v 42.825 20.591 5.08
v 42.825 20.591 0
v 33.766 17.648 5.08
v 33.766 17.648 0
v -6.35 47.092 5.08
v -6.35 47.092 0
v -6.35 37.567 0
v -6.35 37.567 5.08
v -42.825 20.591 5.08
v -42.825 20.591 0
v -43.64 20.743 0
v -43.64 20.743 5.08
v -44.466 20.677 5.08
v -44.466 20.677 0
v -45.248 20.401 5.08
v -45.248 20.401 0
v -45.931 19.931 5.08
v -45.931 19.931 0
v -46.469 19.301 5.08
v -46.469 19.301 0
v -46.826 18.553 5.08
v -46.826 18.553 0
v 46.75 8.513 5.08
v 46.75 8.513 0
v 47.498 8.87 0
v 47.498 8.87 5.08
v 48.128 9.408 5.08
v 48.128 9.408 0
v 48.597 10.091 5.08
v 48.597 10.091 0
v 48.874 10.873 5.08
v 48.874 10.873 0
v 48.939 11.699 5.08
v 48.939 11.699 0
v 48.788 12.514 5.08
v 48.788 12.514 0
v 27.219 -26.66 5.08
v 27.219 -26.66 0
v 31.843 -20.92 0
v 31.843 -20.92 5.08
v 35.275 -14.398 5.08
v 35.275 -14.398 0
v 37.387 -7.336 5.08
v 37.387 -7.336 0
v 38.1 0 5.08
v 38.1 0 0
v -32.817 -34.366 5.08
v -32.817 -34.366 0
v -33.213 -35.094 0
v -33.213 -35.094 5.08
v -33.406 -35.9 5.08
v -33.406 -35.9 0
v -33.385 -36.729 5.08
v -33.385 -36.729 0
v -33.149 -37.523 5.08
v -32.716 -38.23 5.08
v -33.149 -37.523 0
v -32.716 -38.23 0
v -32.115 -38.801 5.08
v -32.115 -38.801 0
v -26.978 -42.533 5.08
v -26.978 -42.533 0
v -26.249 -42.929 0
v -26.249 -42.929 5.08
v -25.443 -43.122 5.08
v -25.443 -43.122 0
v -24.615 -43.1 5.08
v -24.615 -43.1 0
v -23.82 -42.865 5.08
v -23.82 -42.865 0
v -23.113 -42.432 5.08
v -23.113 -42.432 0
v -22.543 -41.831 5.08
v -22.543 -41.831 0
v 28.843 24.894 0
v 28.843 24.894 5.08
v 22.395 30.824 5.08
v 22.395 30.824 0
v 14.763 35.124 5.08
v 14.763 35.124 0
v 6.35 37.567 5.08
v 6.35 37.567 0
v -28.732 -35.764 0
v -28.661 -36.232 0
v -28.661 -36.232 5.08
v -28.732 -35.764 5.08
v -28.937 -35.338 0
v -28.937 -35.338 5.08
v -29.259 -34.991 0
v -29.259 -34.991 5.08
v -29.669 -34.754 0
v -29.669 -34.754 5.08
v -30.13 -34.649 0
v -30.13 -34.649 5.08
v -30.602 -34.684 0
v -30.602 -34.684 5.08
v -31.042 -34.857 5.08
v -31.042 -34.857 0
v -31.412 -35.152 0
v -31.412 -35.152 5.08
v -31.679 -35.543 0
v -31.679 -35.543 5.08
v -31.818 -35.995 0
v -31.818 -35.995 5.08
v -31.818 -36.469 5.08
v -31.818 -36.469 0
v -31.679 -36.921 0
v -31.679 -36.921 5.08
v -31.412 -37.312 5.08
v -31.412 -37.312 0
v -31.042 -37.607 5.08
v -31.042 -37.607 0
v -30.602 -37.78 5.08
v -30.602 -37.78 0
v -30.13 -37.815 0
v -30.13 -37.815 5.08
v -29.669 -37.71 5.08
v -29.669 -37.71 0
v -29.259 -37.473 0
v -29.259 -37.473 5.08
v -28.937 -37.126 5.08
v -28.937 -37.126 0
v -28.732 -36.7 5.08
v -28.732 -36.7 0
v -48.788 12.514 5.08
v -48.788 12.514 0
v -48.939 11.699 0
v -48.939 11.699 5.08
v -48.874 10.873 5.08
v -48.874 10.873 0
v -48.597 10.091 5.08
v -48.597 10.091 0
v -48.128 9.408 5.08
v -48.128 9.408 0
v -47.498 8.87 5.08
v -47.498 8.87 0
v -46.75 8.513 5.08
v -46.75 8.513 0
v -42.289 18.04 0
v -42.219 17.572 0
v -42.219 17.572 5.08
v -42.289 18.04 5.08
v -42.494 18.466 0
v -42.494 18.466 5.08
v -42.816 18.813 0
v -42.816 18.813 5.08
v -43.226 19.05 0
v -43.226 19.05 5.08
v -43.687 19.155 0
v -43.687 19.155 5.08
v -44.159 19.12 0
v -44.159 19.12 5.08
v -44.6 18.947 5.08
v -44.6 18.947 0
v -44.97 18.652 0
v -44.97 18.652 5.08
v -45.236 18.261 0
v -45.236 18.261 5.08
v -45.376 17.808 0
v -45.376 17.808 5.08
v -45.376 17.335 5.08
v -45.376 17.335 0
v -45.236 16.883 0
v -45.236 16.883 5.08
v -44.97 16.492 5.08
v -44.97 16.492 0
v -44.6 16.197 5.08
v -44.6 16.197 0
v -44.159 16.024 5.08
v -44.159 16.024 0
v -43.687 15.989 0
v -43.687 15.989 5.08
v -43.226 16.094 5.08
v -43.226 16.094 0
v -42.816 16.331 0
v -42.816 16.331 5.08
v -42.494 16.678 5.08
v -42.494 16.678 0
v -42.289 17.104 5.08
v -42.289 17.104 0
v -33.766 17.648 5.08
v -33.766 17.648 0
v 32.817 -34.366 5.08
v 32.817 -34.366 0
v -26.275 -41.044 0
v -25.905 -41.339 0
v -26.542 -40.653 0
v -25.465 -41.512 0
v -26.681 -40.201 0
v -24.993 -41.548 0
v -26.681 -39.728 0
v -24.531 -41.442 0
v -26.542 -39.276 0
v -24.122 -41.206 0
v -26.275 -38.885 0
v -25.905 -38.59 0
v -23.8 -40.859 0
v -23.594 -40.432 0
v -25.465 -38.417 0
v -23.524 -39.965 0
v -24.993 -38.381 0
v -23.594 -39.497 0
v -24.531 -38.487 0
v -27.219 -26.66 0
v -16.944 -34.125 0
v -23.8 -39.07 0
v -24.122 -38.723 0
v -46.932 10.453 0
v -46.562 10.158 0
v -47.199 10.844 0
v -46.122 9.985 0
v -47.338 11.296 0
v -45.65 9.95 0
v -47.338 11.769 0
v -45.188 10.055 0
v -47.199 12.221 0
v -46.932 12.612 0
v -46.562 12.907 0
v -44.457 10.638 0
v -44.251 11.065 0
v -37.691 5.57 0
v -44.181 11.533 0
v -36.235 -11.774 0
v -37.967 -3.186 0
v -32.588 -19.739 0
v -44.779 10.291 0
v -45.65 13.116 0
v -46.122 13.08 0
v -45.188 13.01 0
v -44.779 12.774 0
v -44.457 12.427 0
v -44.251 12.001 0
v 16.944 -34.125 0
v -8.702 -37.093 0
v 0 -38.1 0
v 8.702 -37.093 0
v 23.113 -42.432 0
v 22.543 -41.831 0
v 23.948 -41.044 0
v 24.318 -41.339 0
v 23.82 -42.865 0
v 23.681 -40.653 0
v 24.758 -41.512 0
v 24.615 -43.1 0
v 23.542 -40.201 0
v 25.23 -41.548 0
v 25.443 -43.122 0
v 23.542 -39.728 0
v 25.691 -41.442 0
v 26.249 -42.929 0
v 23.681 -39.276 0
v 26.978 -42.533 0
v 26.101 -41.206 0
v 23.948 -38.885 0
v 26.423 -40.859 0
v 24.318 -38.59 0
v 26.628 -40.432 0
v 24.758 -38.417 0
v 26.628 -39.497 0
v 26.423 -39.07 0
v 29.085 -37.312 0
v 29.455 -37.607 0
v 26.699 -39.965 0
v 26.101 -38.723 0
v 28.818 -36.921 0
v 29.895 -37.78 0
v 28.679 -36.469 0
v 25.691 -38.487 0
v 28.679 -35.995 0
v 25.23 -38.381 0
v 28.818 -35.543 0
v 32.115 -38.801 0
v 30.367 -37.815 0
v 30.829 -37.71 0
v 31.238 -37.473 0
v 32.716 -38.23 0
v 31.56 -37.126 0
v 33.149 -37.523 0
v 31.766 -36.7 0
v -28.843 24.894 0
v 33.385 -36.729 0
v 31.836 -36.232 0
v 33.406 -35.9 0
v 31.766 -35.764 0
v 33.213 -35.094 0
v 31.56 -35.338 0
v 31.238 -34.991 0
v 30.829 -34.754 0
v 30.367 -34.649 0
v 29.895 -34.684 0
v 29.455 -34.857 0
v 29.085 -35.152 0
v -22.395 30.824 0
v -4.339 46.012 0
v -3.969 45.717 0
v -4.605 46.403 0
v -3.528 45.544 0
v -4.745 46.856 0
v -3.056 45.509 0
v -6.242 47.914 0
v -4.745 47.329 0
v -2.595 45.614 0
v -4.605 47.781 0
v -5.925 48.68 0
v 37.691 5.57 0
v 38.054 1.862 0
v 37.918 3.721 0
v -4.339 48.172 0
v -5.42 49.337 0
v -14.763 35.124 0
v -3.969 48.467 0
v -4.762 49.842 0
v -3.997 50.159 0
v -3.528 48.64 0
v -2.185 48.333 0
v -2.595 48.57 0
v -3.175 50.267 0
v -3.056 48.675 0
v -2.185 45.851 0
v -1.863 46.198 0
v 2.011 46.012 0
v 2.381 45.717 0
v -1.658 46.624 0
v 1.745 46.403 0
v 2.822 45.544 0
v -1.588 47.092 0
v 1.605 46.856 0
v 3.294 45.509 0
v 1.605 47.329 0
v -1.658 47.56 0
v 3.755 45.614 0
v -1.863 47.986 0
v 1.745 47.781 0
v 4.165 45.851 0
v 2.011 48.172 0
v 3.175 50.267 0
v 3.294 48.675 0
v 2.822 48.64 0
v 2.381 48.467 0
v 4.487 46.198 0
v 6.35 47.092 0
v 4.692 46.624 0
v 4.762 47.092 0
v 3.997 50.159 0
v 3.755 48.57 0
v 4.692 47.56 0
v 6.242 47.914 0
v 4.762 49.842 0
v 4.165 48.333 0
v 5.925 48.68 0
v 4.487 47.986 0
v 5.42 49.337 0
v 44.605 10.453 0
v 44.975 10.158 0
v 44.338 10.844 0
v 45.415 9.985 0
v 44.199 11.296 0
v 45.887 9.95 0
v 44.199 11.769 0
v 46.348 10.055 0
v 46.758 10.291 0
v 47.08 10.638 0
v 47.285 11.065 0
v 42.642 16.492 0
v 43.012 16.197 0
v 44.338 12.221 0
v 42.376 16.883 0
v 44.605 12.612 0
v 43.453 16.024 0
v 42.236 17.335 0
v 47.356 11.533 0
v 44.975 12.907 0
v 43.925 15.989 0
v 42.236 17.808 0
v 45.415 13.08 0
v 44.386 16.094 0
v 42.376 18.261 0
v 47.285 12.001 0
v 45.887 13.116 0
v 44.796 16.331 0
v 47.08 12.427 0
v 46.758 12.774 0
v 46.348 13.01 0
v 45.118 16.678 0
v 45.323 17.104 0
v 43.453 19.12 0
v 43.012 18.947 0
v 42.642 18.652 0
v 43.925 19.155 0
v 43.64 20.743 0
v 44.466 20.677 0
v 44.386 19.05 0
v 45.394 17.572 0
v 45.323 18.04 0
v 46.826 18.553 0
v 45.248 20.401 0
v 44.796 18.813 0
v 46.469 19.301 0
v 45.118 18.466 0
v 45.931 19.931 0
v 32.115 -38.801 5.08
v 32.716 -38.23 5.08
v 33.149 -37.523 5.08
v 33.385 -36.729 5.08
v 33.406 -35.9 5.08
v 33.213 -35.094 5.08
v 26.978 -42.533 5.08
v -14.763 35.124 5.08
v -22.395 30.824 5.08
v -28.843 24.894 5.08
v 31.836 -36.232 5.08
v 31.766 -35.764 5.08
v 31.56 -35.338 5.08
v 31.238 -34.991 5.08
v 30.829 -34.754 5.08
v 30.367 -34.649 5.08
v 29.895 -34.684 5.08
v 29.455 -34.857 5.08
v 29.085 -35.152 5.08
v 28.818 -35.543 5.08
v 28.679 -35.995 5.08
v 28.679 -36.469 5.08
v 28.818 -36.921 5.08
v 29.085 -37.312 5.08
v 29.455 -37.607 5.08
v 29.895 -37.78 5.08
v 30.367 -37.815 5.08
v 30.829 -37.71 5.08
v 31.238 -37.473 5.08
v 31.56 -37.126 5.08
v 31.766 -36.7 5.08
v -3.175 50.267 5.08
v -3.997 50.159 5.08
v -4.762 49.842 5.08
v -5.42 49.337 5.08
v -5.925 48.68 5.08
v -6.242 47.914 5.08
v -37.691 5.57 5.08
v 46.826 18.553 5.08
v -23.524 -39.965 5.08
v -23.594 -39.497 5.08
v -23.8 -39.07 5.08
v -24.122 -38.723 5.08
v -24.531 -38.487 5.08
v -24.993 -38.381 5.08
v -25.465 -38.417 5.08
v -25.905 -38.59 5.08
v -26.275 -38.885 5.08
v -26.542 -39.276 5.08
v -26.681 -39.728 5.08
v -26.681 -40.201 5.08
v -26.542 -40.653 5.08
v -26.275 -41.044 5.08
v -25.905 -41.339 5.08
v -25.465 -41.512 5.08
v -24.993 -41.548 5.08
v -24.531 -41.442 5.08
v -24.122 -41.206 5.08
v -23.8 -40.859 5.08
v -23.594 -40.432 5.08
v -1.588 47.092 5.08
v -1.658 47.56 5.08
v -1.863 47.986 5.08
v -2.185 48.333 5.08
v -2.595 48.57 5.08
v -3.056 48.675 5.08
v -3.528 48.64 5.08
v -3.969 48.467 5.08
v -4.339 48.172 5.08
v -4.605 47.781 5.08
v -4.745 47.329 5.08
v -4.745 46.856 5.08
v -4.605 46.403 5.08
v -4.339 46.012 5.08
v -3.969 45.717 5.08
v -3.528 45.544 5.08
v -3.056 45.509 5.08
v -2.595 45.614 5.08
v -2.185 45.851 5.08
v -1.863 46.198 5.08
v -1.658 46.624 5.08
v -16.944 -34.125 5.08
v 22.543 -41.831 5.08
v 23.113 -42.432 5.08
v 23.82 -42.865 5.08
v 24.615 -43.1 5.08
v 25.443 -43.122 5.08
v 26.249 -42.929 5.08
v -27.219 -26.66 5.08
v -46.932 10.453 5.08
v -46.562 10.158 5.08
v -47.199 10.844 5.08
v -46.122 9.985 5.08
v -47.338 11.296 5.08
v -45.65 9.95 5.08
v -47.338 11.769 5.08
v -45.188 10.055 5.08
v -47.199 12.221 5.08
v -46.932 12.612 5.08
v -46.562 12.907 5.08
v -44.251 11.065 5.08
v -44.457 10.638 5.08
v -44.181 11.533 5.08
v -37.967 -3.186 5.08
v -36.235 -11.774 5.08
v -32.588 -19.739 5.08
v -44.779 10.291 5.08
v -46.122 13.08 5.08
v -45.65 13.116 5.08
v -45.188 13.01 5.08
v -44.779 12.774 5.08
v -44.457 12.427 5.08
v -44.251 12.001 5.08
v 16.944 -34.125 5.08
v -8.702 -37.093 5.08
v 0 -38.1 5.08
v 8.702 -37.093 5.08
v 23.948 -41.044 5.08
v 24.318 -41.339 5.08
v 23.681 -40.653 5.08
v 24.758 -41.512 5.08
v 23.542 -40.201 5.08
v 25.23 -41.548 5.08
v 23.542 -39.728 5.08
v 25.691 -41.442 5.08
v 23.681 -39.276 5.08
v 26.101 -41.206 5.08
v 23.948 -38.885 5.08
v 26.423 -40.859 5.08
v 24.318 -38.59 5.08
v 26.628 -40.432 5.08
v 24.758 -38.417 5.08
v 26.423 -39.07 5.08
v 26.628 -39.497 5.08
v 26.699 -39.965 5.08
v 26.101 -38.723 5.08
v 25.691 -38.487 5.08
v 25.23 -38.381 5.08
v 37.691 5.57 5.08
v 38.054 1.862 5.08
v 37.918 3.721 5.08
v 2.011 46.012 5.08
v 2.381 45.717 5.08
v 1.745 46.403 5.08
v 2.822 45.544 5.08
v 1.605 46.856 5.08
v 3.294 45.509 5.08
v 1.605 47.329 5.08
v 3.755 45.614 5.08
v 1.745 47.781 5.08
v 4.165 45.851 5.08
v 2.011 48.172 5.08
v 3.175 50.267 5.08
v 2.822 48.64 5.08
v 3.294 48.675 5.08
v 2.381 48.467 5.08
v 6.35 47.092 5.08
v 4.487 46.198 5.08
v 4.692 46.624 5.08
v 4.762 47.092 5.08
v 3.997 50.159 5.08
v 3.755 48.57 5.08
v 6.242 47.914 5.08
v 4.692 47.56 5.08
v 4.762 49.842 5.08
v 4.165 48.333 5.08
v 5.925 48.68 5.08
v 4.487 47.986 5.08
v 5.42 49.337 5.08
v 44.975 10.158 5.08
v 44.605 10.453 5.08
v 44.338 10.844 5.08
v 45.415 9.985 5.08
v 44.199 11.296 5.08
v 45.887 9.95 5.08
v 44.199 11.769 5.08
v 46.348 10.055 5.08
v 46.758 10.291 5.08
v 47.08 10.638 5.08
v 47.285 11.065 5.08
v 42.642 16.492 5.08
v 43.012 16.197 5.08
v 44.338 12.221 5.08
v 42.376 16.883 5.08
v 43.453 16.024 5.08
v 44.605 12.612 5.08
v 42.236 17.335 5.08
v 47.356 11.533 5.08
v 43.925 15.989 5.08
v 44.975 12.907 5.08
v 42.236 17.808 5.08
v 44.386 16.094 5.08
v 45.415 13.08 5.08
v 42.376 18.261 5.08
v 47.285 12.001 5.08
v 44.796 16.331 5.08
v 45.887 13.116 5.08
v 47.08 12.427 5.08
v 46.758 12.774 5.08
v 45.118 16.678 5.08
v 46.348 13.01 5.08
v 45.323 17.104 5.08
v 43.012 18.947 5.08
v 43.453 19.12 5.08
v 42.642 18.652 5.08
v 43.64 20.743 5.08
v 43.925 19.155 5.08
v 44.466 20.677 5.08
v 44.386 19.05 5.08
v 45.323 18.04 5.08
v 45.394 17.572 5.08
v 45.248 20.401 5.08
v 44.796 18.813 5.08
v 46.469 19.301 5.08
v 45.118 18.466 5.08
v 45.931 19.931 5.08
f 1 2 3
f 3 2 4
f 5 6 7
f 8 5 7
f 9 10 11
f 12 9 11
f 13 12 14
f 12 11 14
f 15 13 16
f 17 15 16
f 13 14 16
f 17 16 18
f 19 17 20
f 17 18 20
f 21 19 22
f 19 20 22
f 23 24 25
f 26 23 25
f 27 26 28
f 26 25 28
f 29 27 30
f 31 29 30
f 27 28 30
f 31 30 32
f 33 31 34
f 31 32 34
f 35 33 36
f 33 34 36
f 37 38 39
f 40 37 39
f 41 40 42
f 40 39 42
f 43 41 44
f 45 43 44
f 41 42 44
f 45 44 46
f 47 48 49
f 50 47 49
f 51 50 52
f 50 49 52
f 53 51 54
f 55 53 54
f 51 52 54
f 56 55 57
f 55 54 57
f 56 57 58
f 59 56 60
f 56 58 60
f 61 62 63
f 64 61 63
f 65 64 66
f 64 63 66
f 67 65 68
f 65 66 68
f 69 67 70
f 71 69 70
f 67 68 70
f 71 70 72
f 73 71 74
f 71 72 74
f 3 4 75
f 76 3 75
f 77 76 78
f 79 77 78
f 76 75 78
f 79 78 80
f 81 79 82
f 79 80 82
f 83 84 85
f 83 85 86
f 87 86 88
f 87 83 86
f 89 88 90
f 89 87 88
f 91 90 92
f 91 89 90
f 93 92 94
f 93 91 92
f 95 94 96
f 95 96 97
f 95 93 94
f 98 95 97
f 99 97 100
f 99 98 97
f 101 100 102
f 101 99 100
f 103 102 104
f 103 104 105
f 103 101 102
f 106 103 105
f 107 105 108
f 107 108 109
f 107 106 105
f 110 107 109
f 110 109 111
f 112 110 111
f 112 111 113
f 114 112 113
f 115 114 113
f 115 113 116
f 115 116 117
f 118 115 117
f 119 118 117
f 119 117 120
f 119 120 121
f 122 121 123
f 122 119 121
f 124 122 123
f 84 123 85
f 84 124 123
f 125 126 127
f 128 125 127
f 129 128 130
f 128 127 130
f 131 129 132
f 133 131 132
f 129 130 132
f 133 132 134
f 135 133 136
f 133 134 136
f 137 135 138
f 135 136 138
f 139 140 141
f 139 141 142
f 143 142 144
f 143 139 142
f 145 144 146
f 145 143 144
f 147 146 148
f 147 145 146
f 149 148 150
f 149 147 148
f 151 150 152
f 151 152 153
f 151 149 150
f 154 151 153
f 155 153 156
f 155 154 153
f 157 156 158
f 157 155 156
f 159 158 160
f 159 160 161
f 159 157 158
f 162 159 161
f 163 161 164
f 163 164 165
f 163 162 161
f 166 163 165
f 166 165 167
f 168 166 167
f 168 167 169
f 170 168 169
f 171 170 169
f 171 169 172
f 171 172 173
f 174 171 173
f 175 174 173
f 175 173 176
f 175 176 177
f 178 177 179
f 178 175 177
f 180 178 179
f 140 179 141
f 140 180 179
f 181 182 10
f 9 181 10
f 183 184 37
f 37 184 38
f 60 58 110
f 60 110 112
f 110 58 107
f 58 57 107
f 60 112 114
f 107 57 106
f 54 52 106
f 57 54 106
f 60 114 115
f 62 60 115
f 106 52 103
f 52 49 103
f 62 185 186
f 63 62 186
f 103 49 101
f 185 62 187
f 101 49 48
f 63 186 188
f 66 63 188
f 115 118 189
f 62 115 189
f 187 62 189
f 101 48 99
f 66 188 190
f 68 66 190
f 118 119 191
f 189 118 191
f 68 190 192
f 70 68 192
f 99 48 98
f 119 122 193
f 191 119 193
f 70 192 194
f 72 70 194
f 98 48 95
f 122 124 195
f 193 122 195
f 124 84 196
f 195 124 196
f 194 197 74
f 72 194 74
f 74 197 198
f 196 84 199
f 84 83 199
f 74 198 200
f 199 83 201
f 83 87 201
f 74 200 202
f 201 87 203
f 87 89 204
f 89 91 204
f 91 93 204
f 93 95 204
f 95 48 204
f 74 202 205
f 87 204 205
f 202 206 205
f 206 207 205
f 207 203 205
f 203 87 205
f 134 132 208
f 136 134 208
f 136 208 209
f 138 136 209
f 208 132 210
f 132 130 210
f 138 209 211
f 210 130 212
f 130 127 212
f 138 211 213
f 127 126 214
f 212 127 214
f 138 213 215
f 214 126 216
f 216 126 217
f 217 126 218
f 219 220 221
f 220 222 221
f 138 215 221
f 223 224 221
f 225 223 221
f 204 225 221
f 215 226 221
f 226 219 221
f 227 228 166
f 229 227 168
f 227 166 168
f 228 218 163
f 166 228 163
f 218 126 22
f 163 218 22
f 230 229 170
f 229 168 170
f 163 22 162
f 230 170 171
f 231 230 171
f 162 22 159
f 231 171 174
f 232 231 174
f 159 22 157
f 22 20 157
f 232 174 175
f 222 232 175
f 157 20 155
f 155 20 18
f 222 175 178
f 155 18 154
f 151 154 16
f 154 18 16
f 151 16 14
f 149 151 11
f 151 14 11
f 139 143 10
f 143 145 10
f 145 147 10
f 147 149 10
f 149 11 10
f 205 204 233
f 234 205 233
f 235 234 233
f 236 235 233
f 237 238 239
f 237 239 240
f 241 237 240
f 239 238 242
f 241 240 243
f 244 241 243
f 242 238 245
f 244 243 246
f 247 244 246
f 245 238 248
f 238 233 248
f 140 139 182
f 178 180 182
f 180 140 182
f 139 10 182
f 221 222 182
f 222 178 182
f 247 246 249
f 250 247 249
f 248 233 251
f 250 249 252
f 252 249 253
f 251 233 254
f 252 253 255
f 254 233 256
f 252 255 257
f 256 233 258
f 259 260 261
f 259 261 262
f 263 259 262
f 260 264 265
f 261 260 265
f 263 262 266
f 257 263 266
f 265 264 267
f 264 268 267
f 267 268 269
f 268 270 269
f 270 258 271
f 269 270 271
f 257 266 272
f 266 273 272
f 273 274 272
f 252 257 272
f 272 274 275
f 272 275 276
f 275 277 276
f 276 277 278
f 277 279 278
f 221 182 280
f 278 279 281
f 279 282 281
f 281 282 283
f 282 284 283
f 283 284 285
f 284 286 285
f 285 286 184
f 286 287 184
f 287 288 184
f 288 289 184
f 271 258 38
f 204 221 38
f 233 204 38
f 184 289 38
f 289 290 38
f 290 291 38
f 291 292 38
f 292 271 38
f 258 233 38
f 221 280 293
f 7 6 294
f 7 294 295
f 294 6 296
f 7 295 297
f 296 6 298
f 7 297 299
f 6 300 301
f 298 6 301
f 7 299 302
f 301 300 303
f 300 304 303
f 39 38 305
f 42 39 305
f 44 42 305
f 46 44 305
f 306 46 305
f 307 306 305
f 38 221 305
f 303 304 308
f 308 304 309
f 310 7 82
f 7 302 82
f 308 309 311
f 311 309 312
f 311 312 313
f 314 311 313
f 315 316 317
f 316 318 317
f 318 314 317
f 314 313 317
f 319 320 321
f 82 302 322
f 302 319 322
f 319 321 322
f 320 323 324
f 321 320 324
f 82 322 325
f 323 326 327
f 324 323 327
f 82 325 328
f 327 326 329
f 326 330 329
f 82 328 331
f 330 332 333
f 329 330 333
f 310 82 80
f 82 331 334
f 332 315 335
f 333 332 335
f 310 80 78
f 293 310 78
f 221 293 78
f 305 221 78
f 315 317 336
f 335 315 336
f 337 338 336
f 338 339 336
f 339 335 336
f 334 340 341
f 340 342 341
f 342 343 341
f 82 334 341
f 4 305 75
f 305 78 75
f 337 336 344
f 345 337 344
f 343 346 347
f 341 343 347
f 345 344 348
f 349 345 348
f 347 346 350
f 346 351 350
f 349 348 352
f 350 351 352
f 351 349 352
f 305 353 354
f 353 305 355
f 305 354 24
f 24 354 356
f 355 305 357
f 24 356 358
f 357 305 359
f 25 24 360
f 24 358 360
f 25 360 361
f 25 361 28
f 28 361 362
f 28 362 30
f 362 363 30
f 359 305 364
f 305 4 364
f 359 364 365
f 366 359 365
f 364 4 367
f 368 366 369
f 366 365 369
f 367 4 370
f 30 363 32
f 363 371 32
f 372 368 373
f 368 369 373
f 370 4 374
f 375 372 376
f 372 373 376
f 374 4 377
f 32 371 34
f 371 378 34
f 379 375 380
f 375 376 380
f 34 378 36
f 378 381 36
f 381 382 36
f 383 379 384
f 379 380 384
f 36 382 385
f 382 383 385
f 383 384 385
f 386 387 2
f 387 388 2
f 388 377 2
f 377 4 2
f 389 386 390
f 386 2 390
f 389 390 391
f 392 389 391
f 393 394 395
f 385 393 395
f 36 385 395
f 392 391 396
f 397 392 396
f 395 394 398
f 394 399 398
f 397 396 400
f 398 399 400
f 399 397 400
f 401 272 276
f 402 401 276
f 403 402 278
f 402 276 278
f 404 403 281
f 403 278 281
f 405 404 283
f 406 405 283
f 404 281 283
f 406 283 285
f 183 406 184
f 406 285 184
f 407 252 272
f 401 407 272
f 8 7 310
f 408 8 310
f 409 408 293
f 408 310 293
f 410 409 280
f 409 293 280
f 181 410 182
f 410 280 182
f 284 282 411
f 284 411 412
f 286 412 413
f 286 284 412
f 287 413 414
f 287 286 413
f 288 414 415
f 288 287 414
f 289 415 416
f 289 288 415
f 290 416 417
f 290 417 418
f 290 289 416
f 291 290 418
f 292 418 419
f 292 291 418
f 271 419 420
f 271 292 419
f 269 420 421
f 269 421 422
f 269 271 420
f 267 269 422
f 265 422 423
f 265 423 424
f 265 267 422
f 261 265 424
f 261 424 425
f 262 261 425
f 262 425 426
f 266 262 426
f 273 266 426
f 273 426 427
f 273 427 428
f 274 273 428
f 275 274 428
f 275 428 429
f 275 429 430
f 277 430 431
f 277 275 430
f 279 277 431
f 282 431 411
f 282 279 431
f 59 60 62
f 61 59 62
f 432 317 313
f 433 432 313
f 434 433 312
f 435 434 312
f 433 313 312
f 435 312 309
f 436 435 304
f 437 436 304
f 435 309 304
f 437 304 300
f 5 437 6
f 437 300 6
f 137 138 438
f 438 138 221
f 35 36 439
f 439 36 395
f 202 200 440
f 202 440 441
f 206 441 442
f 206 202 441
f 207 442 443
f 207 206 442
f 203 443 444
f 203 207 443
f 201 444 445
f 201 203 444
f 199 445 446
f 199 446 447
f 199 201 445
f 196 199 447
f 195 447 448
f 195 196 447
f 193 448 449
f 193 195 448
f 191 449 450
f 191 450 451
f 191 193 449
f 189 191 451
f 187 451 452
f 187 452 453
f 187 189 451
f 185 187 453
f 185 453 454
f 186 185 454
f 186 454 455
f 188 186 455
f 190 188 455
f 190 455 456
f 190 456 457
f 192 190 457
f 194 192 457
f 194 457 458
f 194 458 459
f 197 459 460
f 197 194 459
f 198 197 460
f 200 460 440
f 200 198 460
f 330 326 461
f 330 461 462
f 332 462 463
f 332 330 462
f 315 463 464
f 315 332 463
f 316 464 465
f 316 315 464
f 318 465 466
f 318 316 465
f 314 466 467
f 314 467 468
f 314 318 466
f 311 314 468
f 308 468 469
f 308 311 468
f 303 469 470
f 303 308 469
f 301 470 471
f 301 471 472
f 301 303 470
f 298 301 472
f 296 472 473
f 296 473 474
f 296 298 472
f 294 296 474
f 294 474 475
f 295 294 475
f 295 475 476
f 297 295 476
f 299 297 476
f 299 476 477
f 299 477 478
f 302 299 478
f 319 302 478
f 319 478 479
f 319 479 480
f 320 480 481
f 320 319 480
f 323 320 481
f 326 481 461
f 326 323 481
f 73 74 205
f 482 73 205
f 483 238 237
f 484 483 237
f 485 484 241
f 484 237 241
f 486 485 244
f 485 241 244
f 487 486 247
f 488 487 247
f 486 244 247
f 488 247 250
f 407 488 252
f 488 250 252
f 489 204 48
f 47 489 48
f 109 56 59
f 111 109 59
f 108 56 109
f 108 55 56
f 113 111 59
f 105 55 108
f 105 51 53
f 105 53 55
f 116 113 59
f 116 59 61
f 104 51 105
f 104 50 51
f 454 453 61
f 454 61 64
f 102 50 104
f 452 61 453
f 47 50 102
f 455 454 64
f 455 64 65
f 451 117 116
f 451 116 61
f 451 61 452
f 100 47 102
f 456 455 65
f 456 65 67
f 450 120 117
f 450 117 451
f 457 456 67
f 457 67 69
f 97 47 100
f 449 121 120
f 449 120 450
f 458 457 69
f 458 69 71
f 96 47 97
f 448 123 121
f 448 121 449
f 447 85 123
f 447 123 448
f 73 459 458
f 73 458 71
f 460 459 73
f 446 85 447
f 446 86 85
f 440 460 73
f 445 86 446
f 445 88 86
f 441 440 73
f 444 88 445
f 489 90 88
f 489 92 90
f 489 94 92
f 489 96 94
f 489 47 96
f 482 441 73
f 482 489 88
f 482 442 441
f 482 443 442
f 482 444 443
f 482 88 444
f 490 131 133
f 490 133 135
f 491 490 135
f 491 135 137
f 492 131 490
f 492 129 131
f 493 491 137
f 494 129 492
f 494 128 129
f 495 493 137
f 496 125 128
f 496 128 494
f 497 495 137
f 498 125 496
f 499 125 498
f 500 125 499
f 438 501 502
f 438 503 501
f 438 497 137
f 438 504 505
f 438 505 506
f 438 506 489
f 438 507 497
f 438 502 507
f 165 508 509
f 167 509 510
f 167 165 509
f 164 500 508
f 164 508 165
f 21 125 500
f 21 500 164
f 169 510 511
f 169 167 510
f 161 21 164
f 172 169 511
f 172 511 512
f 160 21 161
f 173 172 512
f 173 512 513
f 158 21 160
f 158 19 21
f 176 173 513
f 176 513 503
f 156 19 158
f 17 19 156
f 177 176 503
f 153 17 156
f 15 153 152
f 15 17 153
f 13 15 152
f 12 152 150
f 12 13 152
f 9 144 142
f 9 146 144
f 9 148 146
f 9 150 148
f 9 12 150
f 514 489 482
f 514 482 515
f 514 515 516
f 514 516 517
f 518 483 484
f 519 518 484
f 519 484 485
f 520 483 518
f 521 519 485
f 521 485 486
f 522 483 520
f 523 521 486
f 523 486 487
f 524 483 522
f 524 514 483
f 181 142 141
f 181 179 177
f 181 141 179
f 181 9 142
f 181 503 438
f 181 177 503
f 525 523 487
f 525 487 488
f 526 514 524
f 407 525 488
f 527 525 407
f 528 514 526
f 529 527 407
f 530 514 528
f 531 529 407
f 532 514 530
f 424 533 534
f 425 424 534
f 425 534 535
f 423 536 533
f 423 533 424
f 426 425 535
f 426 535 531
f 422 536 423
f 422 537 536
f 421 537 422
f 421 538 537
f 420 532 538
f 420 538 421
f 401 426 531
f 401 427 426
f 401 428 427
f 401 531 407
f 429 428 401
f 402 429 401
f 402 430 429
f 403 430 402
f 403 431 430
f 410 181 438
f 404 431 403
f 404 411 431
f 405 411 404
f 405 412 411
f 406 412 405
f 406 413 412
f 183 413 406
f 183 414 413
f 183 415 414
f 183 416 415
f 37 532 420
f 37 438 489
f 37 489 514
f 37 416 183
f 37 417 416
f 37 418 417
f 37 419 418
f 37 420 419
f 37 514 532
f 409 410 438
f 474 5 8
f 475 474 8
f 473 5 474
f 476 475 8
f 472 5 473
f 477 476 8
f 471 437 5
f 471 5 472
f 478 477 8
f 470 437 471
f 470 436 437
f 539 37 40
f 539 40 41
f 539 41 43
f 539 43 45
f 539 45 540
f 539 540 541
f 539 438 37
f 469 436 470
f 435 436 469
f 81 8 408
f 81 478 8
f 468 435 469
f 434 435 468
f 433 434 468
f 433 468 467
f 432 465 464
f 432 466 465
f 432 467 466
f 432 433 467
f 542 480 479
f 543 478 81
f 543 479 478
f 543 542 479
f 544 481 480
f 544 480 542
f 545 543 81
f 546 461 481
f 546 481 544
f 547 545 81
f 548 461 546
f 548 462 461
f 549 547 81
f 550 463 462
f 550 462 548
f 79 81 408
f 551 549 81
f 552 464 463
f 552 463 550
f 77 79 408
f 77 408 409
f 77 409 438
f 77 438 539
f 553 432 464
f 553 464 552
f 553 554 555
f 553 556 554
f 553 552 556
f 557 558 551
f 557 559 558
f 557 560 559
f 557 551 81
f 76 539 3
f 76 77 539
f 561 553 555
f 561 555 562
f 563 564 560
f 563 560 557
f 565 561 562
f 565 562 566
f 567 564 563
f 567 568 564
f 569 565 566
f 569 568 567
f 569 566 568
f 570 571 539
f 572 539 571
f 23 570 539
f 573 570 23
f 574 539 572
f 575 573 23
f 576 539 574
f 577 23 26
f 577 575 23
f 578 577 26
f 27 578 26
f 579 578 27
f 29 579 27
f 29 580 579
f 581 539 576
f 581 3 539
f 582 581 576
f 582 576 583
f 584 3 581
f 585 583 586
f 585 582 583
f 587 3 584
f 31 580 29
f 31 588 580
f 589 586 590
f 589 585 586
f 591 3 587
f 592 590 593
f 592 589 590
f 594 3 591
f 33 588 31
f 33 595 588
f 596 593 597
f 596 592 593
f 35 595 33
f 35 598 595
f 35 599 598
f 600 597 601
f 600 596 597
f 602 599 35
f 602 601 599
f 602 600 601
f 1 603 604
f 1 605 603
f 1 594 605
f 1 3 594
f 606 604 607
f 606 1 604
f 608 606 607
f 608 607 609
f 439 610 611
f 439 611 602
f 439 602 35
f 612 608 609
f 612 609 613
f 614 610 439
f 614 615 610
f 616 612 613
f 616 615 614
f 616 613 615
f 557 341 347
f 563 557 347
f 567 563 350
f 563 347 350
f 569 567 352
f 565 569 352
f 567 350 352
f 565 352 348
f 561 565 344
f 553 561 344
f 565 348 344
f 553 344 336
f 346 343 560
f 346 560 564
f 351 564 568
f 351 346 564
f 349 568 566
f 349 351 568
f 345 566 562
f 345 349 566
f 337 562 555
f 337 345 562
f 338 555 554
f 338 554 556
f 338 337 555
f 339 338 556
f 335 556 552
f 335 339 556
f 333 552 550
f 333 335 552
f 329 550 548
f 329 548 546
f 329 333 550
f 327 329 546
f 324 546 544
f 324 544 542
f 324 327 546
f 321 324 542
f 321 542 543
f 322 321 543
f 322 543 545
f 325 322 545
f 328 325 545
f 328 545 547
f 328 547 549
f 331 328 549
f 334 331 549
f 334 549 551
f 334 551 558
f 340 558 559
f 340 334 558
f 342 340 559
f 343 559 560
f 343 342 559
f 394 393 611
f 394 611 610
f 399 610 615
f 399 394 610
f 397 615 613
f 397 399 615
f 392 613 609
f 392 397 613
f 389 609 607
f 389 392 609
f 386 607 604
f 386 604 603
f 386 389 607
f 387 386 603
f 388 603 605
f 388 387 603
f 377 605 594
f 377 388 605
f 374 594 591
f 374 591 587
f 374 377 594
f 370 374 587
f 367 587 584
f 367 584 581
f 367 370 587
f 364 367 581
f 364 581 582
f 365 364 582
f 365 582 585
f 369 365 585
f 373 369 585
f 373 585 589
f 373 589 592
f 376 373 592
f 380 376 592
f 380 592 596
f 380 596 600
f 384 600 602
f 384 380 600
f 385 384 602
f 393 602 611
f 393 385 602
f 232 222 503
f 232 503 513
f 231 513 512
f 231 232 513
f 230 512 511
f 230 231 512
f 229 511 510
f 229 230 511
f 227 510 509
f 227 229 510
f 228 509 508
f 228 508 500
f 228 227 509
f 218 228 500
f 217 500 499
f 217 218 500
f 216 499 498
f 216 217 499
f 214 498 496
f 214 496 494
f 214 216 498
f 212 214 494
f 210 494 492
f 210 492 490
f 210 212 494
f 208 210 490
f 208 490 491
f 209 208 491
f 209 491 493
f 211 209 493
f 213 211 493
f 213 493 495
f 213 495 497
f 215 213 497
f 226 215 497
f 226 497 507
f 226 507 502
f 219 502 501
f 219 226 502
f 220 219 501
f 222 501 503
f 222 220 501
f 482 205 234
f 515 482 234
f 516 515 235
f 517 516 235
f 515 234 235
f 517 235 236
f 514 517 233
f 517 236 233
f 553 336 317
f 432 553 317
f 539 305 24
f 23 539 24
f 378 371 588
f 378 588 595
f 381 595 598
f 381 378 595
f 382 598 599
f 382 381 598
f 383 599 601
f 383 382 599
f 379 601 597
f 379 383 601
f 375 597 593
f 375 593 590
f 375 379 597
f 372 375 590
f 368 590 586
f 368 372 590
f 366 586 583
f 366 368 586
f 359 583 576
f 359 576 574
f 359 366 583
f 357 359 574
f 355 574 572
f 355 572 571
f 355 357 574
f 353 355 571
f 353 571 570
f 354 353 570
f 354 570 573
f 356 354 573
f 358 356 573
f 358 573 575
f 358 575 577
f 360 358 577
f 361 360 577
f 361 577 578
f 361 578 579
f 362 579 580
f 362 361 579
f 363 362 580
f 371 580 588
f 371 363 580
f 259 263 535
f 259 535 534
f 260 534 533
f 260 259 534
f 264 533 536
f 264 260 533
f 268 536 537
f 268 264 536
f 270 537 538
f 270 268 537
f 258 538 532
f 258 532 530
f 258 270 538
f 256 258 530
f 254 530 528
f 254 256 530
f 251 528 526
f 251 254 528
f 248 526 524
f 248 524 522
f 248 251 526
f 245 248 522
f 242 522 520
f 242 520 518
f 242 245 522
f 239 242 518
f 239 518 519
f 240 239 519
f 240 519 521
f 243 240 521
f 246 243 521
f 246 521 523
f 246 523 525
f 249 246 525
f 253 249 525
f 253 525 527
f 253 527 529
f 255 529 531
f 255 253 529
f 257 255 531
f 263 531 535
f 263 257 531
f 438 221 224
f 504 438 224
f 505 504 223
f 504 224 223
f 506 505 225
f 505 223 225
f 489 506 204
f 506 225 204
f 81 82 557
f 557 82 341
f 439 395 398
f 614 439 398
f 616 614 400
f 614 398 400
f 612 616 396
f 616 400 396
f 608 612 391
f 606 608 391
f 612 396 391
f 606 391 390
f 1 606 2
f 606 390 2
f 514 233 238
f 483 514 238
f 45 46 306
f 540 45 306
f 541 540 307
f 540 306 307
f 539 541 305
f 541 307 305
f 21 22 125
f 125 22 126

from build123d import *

# Parameters (mm, degrees)
F0_R     = 1.5875
F1_DEPTH = 5.08


with BuildPart() as f1:
    # F0 (on Top) → F1 (new body)
    with BuildSketch(Plane.XY):
        with BuildLine():
            ThreePointArc((27.218649, -26.659991), (35.274924, -14.39756), (38.1, 0))
            ThreePointArc((38.1, 0), (37.997537, 2.792342), (37.690699, 5.569665))
            ThreePointArc((37.690699, 5.569665), (36.235253, 11.773547), (33.766184, 17.648083))
            ThreePointArc((33.766184, 17.648083), (22.394618, 30.823547), (6.35, 37.567107))
            ThreePointArc((6.35, 37.567107), (0, 38.1), (-6.35, 37.567107))
            ThreePointArc((-6.35, 37.567107), (-22.394618, 30.823547), (-33.766184, 17.648083))
            ThreePointArc((-33.766184, 17.648083), (-36.235253, 11.773547), (-37.690699, 5.569665))
            ThreePointArc((-37.690699, 5.569665), (-36.235253, -11.773547), (-27.218649, -26.659991))
            ThreePointArc((-27.218649, -26.659991), (-22.394618, -30.823547), (-16.944133, -34.124864))
            ThreePointArc((-16.944133, -34.124864), (0, -38.1), (16.944133, -34.124864))
            ThreePointArc((16.944133, -34.124864), (22.394618, -30.823547), (27.218649, -26.659991))
        make_face()
        with BuildLine():
            ThreePointArc((33.766184, 17.648083), (36.235253, 11.773547), (37.690699, 5.569665))
            Line((37.690699, 5.569665), (46.749513, 8.513052))
            ThreePointArc((46.749513, 8.513052), (48.59733, 10.091237), (48.787988, 12.513786))
            Line((48.787988, 12.513786), (46.82573, 18.552995))
            ThreePointArc((46.82573, 18.552995), (45.247546, 20.400811), (42.824997, 20.59147))
            Line((42.824997, 20.59147), (33.766184, 17.648083))
        make_face()
        with Locations((45.768384, 11.532657)):
            Circle(F0_R, mode=Mode.SUBTRACT)
        with Locations((43.806126, 17.571866)):
            Circle(F0_R, mode=Mode.SUBTRACT)
        with BuildLine():
            Line((32.817304, -34.365878), (27.218649, -26.659991))
            ThreePointArc((27.218649, -26.659991), (22.394618, -30.823547), (16.944133, -34.124864))
            Line((16.944133, -34.124864), (22.542788, -41.830751))
            ThreePointArc((22.542788, -41.830751), (24.614737, -43.100443), (26.977635, -42.533162))
            Line((26.977635, -42.533162), (32.114893, -38.800725))
            ThreePointArc((32.114893, -38.800725), (33.384585, -36.728776), (32.817304, -34.365878))
        make_face()
        with Locations((25.111417, -39.964533)):
            Circle(F0_R, mode=Mode.SUBTRACT)
        with Locations((30.248675, -36.232096)):
            Circle(F0_R, mode=Mode.SUBTRACT)
        with BuildLine():
            ThreePointArc((-6.35, 37.567107), (0, 38.1), (6.35, 37.567107))
            Line((6.35, 37.567107), (6.35, 47.092107))
            ThreePointArc((6.35, 47.092107), (5.420064, 49.337171), (3.175, 50.267107))
            Line((3.175, 50.267107), (-3.175, 50.267107))
            ThreePointArc((-3.175, 50.267107), (-5.420064, 49.337171), (-6.35, 47.092107))
            Line((-6.35, 47.092107), (-6.35, 37.567107))
        make_face()
        with Locations((-3.175, 47.092107)):
            Circle(F0_R, mode=Mode.SUBTRACT)
        with Locations((3.175, 47.092107)):
            Circle(F0_R, mode=Mode.SUBTRACT)
        with BuildLine():
            Line((-22.542788, -41.830751), (-16.944133, -34.124864))
            ThreePointArc((-16.944133, -34.124864), (-22.394618, -30.823547), (-27.218649, -26.659991))
            Line((-27.218649, -26.659991), (-32.817304, -34.365878))
            ThreePointArc((-32.817304, -34.365878), (-33.384585, -36.728776), (-32.114893, -38.800725))
            Line((-32.114893, -38.800725), (-26.977635, -42.533162))
            ThreePointArc((-26.977635, -42.533162), (-24.614737, -43.100443), (-22.542788, -41.830751))
        make_face()
        with Locations((-25.111417, -39.964533)):
            Circle(F0_R, mode=Mode.SUBTRACT)
        with Locations((-30.248675, -36.232096)):
            Circle(F0_R, mode=Mode.SUBTRACT)
        with BuildLine():
            ThreePointArc((-37.690699, 5.569665), (-36.235253, 11.773547), (-33.766184, 17.648083))
            Line((-33.766184, 17.648083), (-42.824997, 20.59147))
            ThreePointArc((-42.824997, 20.59147), (-45.247546, 20.400811), (-46.82573, 18.552995))
            Line((-46.82573, 18.552995), (-48.787988, 12.513786))
            ThreePointArc((-48.787988, 12.513786), (-48.59733, 10.091237), (-46.749513, 8.513052))
            Line((-46.749513, 8.513052), (-37.690699, 5.569665))
        make_face()
        with Locations((-45.768384, 11.532657)):
            Circle(F0_R, mode=Mode.SUBTRACT)
        with Locations((-43.806126, 17.571866)):
            Circle(F0_R, mode=Mode.SUBTRACT)
    extrude(amount=F1_DEPTH)


solid = f1.part
